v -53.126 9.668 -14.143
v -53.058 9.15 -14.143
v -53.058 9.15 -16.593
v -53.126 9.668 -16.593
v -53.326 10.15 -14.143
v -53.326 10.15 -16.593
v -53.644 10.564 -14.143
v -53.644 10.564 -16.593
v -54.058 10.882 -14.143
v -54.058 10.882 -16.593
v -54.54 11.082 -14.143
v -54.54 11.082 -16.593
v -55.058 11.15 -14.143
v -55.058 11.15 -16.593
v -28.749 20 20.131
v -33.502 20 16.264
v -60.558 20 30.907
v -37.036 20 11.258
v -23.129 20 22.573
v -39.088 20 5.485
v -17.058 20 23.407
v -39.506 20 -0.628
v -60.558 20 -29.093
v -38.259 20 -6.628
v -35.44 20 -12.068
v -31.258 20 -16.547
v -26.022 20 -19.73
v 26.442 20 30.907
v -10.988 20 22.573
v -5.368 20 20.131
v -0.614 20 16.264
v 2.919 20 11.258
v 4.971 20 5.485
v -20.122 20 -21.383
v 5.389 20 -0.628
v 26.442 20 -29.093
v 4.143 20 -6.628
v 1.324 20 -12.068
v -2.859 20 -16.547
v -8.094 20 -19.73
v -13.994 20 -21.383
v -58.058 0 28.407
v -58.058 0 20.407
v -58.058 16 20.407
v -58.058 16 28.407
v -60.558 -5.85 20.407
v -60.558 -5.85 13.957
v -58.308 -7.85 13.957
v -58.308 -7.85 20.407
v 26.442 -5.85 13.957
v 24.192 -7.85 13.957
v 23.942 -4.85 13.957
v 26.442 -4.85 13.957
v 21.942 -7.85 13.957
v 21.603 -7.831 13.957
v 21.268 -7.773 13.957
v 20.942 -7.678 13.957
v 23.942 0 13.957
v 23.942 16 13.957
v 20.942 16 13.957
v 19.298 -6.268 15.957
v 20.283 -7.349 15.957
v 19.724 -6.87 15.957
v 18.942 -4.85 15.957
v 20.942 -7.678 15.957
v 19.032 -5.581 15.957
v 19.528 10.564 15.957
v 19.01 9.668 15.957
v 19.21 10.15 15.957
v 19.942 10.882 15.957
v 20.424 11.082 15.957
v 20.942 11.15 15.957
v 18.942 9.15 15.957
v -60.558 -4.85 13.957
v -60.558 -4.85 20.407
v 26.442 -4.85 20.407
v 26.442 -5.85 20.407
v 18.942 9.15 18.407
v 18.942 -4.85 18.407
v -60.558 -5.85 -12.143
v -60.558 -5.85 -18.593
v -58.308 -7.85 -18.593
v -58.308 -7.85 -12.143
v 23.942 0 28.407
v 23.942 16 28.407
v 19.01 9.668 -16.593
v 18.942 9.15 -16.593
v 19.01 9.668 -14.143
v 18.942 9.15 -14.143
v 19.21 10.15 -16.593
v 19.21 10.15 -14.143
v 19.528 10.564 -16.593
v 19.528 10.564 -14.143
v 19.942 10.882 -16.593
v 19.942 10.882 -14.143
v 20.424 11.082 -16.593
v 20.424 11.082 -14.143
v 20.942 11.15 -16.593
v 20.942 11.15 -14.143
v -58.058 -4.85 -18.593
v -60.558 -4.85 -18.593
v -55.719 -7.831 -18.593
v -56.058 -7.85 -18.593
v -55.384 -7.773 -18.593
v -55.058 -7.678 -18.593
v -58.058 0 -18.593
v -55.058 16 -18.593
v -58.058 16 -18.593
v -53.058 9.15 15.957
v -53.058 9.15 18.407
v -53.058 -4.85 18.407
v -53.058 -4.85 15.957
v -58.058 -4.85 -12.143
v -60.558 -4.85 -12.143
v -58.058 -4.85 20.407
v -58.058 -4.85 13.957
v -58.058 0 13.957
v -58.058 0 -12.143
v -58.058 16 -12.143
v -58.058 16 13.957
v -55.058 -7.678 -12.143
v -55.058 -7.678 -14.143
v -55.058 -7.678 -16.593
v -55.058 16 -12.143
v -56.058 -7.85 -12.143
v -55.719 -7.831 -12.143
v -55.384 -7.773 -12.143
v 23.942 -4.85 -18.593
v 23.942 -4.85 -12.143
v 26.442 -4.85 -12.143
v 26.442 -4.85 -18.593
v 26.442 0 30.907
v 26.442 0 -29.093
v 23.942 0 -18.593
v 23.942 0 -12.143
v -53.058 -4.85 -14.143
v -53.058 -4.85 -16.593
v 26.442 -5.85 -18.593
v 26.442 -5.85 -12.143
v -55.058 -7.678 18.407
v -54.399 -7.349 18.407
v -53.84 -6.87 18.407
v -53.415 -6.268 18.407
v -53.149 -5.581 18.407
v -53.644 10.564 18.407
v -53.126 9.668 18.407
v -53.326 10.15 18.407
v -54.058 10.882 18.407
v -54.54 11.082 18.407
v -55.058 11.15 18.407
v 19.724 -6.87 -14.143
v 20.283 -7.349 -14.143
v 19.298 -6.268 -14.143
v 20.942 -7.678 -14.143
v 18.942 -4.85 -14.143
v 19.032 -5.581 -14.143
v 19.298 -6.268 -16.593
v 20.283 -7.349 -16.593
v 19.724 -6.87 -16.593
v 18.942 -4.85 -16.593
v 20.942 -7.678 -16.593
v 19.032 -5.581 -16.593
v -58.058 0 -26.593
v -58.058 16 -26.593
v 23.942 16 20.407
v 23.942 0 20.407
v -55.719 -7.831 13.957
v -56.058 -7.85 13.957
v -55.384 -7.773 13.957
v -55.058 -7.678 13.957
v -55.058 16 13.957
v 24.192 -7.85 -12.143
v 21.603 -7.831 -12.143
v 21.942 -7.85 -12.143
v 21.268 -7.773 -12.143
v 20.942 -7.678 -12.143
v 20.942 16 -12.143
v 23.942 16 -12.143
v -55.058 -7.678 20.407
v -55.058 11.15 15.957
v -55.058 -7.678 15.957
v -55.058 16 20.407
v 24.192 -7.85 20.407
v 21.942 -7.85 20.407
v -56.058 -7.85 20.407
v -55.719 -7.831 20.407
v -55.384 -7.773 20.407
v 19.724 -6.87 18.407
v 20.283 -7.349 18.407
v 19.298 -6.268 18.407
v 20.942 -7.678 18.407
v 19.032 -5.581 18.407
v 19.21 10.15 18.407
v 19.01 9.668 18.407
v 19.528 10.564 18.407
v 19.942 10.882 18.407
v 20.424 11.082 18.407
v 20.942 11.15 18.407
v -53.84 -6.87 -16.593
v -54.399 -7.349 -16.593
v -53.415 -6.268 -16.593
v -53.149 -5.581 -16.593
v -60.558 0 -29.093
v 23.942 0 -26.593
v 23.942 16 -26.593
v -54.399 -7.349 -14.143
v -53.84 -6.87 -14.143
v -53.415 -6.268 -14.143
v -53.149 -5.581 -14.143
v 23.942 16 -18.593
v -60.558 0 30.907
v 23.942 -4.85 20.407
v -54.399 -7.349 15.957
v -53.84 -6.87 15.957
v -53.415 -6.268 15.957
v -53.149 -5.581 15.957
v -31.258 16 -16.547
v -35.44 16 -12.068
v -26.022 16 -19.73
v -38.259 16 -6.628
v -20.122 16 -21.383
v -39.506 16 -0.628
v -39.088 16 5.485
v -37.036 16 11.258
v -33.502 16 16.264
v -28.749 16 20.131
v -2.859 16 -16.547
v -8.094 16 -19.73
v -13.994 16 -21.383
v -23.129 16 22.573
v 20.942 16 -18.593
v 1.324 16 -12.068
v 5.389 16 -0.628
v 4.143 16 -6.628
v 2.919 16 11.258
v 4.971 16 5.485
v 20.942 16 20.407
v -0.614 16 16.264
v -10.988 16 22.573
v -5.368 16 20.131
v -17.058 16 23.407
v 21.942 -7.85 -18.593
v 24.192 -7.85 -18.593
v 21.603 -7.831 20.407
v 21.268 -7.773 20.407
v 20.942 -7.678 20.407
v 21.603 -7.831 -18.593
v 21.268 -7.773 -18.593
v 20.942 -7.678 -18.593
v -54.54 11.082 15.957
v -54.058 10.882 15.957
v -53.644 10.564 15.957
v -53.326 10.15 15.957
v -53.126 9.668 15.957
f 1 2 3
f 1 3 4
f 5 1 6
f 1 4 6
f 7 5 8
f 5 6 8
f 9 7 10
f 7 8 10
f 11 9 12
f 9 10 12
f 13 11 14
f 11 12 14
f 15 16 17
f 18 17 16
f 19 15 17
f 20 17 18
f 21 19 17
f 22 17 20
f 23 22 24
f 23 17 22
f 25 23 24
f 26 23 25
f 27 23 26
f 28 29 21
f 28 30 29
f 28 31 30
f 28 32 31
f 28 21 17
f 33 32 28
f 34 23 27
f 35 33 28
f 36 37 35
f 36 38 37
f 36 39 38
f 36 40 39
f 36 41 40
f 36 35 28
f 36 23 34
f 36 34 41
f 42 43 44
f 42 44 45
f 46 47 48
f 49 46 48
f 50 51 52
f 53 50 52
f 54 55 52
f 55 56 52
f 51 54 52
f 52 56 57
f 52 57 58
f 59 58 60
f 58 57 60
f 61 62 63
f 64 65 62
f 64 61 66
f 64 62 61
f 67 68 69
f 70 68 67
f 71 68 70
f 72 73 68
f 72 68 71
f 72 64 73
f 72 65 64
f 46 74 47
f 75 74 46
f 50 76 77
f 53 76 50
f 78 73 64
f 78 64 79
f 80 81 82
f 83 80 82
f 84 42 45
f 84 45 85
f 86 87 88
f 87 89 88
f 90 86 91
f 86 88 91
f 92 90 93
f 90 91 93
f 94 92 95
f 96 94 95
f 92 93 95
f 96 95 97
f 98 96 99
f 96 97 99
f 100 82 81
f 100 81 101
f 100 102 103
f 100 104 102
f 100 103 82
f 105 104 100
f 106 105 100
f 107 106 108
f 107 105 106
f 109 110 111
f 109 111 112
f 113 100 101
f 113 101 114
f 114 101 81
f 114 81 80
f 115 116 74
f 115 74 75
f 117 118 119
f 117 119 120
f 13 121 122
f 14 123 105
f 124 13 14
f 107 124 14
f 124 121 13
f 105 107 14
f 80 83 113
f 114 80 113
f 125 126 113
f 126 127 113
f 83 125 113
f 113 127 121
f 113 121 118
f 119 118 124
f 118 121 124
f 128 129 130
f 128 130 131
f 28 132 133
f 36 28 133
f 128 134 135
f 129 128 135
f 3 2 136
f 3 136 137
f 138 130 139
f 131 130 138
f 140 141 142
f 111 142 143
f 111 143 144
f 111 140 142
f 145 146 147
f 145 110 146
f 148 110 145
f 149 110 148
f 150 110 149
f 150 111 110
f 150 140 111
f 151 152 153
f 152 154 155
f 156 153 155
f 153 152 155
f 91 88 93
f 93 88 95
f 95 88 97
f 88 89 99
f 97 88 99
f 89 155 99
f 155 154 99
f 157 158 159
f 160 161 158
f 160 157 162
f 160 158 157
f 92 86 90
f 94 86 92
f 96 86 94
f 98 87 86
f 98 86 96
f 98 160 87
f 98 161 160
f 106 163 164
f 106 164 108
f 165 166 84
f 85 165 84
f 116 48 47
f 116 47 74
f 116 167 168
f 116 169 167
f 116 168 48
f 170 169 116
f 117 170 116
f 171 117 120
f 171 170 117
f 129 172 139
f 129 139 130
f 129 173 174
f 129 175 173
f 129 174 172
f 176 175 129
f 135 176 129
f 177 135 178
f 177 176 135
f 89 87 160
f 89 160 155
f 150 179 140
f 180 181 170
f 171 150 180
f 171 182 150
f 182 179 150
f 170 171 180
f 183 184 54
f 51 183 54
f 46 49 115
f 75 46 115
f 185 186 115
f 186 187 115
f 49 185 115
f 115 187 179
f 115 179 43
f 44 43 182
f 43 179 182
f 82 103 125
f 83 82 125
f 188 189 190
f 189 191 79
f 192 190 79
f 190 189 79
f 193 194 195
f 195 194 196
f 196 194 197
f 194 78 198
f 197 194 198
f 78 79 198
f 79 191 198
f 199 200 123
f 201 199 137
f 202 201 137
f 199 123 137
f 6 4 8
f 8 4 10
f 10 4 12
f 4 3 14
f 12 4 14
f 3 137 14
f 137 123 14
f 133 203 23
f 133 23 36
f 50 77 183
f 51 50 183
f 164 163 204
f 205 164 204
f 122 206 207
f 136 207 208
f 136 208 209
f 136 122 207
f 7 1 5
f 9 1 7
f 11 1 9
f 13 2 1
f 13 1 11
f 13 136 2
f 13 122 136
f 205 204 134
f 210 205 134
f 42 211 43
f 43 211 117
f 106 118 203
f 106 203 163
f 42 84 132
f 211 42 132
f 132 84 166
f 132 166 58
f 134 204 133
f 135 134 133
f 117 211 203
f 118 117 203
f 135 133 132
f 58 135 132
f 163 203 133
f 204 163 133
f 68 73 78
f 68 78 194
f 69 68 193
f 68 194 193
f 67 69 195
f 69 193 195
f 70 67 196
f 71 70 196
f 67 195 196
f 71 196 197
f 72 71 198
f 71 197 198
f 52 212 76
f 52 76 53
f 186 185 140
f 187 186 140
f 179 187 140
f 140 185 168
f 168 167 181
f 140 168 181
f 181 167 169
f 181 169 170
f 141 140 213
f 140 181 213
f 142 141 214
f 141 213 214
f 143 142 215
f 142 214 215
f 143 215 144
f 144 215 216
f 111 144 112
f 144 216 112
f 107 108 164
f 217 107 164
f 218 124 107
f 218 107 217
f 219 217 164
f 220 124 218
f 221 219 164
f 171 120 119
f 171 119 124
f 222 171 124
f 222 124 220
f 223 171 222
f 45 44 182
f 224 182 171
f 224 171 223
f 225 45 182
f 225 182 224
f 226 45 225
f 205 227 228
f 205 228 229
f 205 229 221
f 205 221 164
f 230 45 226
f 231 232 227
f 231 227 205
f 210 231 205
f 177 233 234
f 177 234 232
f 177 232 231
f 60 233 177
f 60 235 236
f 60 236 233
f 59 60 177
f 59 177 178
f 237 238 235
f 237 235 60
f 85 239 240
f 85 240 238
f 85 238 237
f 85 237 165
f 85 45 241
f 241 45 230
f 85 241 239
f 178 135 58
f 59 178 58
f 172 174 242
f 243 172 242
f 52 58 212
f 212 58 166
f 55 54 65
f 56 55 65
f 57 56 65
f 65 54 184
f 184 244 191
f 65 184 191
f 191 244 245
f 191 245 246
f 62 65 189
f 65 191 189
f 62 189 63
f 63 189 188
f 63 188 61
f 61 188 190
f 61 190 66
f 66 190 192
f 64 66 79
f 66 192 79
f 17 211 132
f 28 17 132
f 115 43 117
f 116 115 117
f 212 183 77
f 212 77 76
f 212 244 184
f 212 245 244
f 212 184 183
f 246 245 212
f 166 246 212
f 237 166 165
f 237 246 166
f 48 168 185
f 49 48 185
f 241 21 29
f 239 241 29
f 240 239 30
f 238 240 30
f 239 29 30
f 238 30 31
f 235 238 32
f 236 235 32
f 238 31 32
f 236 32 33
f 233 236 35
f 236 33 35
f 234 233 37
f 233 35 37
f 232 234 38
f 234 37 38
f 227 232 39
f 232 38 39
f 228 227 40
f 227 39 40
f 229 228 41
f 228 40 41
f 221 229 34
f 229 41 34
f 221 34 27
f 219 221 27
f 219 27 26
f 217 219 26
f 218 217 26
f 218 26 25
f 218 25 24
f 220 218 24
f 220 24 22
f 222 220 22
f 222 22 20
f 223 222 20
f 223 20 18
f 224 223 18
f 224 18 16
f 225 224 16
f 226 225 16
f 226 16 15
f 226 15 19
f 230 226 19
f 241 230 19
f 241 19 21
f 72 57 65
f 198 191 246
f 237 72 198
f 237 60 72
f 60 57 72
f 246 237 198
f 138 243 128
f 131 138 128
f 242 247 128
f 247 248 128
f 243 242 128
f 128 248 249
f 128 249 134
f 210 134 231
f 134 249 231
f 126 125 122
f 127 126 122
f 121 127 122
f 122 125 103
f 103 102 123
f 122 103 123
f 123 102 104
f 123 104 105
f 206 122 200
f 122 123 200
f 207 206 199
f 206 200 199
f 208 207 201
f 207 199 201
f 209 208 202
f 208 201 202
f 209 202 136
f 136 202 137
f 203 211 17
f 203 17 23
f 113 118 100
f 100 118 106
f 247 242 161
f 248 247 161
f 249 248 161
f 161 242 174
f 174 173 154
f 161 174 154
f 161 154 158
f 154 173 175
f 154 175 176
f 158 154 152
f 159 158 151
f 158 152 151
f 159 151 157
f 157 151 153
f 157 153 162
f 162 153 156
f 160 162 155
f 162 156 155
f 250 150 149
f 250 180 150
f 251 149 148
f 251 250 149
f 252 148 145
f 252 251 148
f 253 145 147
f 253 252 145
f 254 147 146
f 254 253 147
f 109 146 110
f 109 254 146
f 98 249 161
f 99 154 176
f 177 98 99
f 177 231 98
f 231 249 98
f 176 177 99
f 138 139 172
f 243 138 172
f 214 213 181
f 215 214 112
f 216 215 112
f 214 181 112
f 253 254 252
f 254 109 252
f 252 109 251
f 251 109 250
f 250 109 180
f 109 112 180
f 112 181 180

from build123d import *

# Parameters (mm, degrees)
SKETCH1_W            = 87
SKETCH1_H            = 60
BOSS_EXTRUDE1_DEPTH  = 20
SKETCH2_R            = 22.5
CUT_EXTRUDE1_DEPTH   = 20
SKETCH3_W            = 82
SKETCH3_H            = 55
CUT_EXTRUDE2_DEPTH   = 16
SKETCH4_W            = 6.45
SKETCH4_H            = 23.85
BOSS_EXTRUDE2_DEPTH  = 3
SKETCH5_W            = 2.45
SKETCH5_H            = 19
BOSS_EXTRUDE3_DEPTH  = 2
FILLET5_R            = 3
FILLET7_R            = 2
SKETCH6_W            = 2.45
SKETCH6_H            = 19
BOSS_EXTRUDE4_DEPTH  = 2
FILLET8_R            = 3
FILLET9_R            = 2
SKETCH7_W            = 6.45
SKETCH7_H            = 3
BOSS_EXTRUDE5_DEPTH  = 2.5
SKETCH9_W            = 6.45
SKETCH9_H            = 3
BOSS_EXTRUDE6_DEPTH  = 2.5
CUT_EXTRUDE3_DEPTH   = 81.731271908
SKETCH46_W           = 6.45
SKETCH46_H           = 23.85
BOSS_EXTRUDE22_DEPTH = 3
SKETCH47_W           = 2.45
SKETCH47_H           = 19
BOSS_EXTRUDE23_DEPTH = 2
SKETCH48_W           = 2.45
SKETCH48_H           = 19
BOSS_EXTRUDE24_DEPTH = 2
FILLET11_R           = 3
FILLET12_R           = 3
FILLET13_R           = 2
FILLET14_R           = 2
SKETCH49_W           = 6.45
SKETCH49_H           = 3
BOSS_EXTRUDE25_DEPTH = 2.5
SKETCH50_W           = 6.45
SKETCH50_H           = 3
BOSS_EXTRUDE26_DEPTH = 2.5
CUT_EXTRUDE8_DEPTH   = 81.731271908


with BuildPart() as part:
    # Sketch1 → Boss-Extrude1 (new body)
    with BuildSketch(Plane(origin=(0, 0, 0), x_dir=(1, 0, 0), z_dir=(0, 1, 0))):
        with Locations((-17.058139535, -0.906976744)):
            Rectangle(SKETCH1_W, SKETCH1_H)
    extrude(amount=BOSS_EXTRUDE1_DEPTH)

    # Sketch2 → Cut-Extrude1 (cut)
    with BuildSketch(Plane(origin=(0, 20, 0), x_dir=(1, 0, 0), z_dir=(0, 1, 0))):
        with Locations(Location((-17.058139535, -0.906976744, 0), (0, 0, 270))):
            Circle(SKETCH2_R)
    extrude(amount=-CUT_EXTRUDE1_DEPTH, mode=Mode.SUBTRACT)

    # Sketch3 → Cut-Extrude2 (cut)
    with BuildSketch(Plane.XZ):
        with Locations((-17.058139535, 0.906976744)):
            Rectangle(SKETCH3_W, SKETCH3_H)
    extrude(amount=-CUT_EXTRUDE2_DEPTH, mode=Mode.SUBTRACT)

    # Sketch4 → Boss-Extrude2 (add)
    with BuildSketch(Plane.ZY.offset(-23.941860465)):
        with Locations((-15.368023256, 4.075)):
            Rectangle(SKETCH4_W, SKETCH4_H)
        with Locations((17.181976744, 4.075)):
            Rectangle(SKETCH4_W, SKETCH4_H)
    extrude(amount=BOSS_EXTRUDE2_DEPTH)

    # Sketch5 → Boss-Extrude3 (add)
    with BuildSketch(Plane.ZY.offset(-20.941860465)):
        with Locations((-15.368023256, 1.65)):
            Rectangle(SKETCH5_W, SKETCH5_H)
    extrude(amount=BOSS_EXTRUDE3_DEPTH)

    # Fillet5
    fillet5_edges = [part.edges().sort_by_distance(p)[0] for p in [
        (18.941860465, -7.85, -15.368023256),
    ]]
    fillet(fillet5_edges, radius=FILLET5_R)

    # Fillet7
    fillet7_edges = [part.edges().sort_by_distance(p)[0] for p in [
        (18.941860465, 11.15, -15.368023256),
    ]]
    fillet(fillet7_edges, radius=FILLET7_R - 0.0001)  # a hair under: the kernel refuses the full size

    # Sketch6 → Boss-Extrude4 (add)
    with BuildSketch(Plane.ZY.offset(-20.941860465)):
        with Locations((17.181976744, 1.65)):
            Rectangle(SKETCH6_W, SKETCH6_H)
    extrude(amount=BOSS_EXTRUDE4_DEPTH)

    # Fillet8
    fillet8_edges = [part.edges().sort_by_distance(p)[0] for p in [
        (18.941860465, -7.85, 17.181976744),
    ]]
    fillet(fillet8_edges, radius=FILLET8_R)

    # Fillet9
    fillet9_edges = [part.edges().sort_by_distance(p)[0] for p in [
        (18.941860465, 11.15, 17.181976744),
    ]]
    fillet(fillet9_edges, radius=FILLET9_R - 0.0001)  # a hair under: the kernel refuses the full size

    # Sketch7 → Boss-Extrude5 (add)
    with BuildSketch(Plane(origin=(23.941860465, 0, 0), x_dir=(0, 0, -1), z_dir=(1, 0, 0))):
        with Locations((-17.181976744, -6.35)):
            Rectangle(SKETCH7_W, SKETCH7_H)
    extrude(amount=BOSS_EXTRUDE5_DEPTH)

    # Sketch9 → Boss-Extrude6 (add)
    with BuildSketch(Plane(origin=(23.941860465, 0, 0), x_dir=(0, 0, -1), z_dir=(1, 0, 0))):
        with Locations((15.368023256, -6.35)):
            Rectangle(SKETCH9_W, SKETCH9_H)
    extrude(amount=BOSS_EXTRUDE6_DEPTH)

    # Sketch8 → Cut-Extrude3 (cut, through all)
    with BuildSketch(Plane.XY.offset(20.406976744)):
        Polygon((26.441860465, -5.85), (24.191860465, -7.85), (26.441860465, -7.85), align=None)
    extrude(amount=-CUT_EXTRUDE3_DEPTH, mode=Mode.SUBTRACT)

    # Sketch46 → Boss-Extrude22 (add)
    with BuildSketch(Plane(origin=(-58.058139535, 0, 0), x_dir=(0, 0, -1), z_dir=(1, 0, 0))):
        with Locations((-17.181976744, 4.075)):
            Rectangle(SKETCH46_W, SKETCH46_H)
        with Locations((15.368023256, 4.075)):
            Rectangle(SKETCH46_W, SKETCH46_H)
    extrude(amount=BOSS_EXTRUDE22_DEPTH)

    # Sketch47 → Boss-Extrude23 (add)
    with BuildSketch(Plane(origin=(-55.058139535, 0, 0), x_dir=(0, 0, -1), z_dir=(1, 0, 0))):
        with Locations((-17.181976744, 1.65)):
            Rectangle(SKETCH47_W, SKETCH47_H)
    extrude(amount=BOSS_EXTRUDE23_DEPTH)

    # Sketch48 → Boss-Extrude24 (add)
    with BuildSketch(Plane(origin=(-55.058139535, 0, 0), x_dir=(0, 0, -1), z_dir=(1, 0, 0))):
        with Locations((15.368023256, 1.65)):
            Rectangle(SKETCH48_W, SKETCH48_H)
    extrude(amount=BOSS_EXTRUDE24_DEPTH)

    # Fillet11
    fillet11_edges = [part.edges().sort_by_distance(p)[0] for p in [
        (-53.058139535, -7.85, 17.181976744),
    ]]
    fillet(fillet11_edges, radius=FILLET11_R)

    # Fillet12
    fillet12_edges = [part.edges().sort_by_distance(p)[0] for p in [
        (-53.058139535, -7.85, -15.368023256),
    ]]
    fillet(fillet12_edges, radius=FILLET12_R)

    # Fillet13
    fillet13_edges = [part.edges().sort_by_distance(p)[0] for p in [
        (-53.058139535, 11.15, -15.368023256),
    ]]
    fillet(fillet13_edges, radius=FILLET13_R - 0.0001)  # a hair under: the kernel refuses the full size

    # Fillet14
    fillet14_edges = [part.edges().sort_by_distance(p)[0] for p in [
        (-53.058139535, 11.15, 17.181976744),
    ]]
    fillet(fillet14_edges, radius=FILLET14_R - 0.0001)  # a hair under: the kernel refuses the full size

    # Sketch49 → Boss-Extrude25 (add)
    with BuildSketch(Plane.ZY.offset(58.058139535)):
        with Locations((17.181976744, -6.35)):
            Rectangle(SKETCH49_W, SKETCH49_H)
    extrude(amount=BOSS_EXTRUDE25_DEPTH)

    # Sketch50 → Boss-Extrude26 (add)
    with BuildSketch(Plane.ZY.offset(58.058139535)):
        with Locations((-15.368023256, -6.35)):
            Rectangle(SKETCH50_W, SKETCH50_H)
    extrude(amount=BOSS_EXTRUDE26_DEPTH)

    # Sketch52 → Cut-Extrude8 (cut, through all)
    with BuildSketch(Plane(origin=(0, 0, -18.593023256), x_dir=(-1, 0, 0), z_dir=(0, 0, -1))):
        Polygon((60.558139535, -5.85), (58.308139535, -7.85), (60.558139535, -7.85), align=None)
    extrude(amount=-CUT_EXTRUDE8_DEPTH, mode=Mode.SUBTRACT)


solid = part.part
